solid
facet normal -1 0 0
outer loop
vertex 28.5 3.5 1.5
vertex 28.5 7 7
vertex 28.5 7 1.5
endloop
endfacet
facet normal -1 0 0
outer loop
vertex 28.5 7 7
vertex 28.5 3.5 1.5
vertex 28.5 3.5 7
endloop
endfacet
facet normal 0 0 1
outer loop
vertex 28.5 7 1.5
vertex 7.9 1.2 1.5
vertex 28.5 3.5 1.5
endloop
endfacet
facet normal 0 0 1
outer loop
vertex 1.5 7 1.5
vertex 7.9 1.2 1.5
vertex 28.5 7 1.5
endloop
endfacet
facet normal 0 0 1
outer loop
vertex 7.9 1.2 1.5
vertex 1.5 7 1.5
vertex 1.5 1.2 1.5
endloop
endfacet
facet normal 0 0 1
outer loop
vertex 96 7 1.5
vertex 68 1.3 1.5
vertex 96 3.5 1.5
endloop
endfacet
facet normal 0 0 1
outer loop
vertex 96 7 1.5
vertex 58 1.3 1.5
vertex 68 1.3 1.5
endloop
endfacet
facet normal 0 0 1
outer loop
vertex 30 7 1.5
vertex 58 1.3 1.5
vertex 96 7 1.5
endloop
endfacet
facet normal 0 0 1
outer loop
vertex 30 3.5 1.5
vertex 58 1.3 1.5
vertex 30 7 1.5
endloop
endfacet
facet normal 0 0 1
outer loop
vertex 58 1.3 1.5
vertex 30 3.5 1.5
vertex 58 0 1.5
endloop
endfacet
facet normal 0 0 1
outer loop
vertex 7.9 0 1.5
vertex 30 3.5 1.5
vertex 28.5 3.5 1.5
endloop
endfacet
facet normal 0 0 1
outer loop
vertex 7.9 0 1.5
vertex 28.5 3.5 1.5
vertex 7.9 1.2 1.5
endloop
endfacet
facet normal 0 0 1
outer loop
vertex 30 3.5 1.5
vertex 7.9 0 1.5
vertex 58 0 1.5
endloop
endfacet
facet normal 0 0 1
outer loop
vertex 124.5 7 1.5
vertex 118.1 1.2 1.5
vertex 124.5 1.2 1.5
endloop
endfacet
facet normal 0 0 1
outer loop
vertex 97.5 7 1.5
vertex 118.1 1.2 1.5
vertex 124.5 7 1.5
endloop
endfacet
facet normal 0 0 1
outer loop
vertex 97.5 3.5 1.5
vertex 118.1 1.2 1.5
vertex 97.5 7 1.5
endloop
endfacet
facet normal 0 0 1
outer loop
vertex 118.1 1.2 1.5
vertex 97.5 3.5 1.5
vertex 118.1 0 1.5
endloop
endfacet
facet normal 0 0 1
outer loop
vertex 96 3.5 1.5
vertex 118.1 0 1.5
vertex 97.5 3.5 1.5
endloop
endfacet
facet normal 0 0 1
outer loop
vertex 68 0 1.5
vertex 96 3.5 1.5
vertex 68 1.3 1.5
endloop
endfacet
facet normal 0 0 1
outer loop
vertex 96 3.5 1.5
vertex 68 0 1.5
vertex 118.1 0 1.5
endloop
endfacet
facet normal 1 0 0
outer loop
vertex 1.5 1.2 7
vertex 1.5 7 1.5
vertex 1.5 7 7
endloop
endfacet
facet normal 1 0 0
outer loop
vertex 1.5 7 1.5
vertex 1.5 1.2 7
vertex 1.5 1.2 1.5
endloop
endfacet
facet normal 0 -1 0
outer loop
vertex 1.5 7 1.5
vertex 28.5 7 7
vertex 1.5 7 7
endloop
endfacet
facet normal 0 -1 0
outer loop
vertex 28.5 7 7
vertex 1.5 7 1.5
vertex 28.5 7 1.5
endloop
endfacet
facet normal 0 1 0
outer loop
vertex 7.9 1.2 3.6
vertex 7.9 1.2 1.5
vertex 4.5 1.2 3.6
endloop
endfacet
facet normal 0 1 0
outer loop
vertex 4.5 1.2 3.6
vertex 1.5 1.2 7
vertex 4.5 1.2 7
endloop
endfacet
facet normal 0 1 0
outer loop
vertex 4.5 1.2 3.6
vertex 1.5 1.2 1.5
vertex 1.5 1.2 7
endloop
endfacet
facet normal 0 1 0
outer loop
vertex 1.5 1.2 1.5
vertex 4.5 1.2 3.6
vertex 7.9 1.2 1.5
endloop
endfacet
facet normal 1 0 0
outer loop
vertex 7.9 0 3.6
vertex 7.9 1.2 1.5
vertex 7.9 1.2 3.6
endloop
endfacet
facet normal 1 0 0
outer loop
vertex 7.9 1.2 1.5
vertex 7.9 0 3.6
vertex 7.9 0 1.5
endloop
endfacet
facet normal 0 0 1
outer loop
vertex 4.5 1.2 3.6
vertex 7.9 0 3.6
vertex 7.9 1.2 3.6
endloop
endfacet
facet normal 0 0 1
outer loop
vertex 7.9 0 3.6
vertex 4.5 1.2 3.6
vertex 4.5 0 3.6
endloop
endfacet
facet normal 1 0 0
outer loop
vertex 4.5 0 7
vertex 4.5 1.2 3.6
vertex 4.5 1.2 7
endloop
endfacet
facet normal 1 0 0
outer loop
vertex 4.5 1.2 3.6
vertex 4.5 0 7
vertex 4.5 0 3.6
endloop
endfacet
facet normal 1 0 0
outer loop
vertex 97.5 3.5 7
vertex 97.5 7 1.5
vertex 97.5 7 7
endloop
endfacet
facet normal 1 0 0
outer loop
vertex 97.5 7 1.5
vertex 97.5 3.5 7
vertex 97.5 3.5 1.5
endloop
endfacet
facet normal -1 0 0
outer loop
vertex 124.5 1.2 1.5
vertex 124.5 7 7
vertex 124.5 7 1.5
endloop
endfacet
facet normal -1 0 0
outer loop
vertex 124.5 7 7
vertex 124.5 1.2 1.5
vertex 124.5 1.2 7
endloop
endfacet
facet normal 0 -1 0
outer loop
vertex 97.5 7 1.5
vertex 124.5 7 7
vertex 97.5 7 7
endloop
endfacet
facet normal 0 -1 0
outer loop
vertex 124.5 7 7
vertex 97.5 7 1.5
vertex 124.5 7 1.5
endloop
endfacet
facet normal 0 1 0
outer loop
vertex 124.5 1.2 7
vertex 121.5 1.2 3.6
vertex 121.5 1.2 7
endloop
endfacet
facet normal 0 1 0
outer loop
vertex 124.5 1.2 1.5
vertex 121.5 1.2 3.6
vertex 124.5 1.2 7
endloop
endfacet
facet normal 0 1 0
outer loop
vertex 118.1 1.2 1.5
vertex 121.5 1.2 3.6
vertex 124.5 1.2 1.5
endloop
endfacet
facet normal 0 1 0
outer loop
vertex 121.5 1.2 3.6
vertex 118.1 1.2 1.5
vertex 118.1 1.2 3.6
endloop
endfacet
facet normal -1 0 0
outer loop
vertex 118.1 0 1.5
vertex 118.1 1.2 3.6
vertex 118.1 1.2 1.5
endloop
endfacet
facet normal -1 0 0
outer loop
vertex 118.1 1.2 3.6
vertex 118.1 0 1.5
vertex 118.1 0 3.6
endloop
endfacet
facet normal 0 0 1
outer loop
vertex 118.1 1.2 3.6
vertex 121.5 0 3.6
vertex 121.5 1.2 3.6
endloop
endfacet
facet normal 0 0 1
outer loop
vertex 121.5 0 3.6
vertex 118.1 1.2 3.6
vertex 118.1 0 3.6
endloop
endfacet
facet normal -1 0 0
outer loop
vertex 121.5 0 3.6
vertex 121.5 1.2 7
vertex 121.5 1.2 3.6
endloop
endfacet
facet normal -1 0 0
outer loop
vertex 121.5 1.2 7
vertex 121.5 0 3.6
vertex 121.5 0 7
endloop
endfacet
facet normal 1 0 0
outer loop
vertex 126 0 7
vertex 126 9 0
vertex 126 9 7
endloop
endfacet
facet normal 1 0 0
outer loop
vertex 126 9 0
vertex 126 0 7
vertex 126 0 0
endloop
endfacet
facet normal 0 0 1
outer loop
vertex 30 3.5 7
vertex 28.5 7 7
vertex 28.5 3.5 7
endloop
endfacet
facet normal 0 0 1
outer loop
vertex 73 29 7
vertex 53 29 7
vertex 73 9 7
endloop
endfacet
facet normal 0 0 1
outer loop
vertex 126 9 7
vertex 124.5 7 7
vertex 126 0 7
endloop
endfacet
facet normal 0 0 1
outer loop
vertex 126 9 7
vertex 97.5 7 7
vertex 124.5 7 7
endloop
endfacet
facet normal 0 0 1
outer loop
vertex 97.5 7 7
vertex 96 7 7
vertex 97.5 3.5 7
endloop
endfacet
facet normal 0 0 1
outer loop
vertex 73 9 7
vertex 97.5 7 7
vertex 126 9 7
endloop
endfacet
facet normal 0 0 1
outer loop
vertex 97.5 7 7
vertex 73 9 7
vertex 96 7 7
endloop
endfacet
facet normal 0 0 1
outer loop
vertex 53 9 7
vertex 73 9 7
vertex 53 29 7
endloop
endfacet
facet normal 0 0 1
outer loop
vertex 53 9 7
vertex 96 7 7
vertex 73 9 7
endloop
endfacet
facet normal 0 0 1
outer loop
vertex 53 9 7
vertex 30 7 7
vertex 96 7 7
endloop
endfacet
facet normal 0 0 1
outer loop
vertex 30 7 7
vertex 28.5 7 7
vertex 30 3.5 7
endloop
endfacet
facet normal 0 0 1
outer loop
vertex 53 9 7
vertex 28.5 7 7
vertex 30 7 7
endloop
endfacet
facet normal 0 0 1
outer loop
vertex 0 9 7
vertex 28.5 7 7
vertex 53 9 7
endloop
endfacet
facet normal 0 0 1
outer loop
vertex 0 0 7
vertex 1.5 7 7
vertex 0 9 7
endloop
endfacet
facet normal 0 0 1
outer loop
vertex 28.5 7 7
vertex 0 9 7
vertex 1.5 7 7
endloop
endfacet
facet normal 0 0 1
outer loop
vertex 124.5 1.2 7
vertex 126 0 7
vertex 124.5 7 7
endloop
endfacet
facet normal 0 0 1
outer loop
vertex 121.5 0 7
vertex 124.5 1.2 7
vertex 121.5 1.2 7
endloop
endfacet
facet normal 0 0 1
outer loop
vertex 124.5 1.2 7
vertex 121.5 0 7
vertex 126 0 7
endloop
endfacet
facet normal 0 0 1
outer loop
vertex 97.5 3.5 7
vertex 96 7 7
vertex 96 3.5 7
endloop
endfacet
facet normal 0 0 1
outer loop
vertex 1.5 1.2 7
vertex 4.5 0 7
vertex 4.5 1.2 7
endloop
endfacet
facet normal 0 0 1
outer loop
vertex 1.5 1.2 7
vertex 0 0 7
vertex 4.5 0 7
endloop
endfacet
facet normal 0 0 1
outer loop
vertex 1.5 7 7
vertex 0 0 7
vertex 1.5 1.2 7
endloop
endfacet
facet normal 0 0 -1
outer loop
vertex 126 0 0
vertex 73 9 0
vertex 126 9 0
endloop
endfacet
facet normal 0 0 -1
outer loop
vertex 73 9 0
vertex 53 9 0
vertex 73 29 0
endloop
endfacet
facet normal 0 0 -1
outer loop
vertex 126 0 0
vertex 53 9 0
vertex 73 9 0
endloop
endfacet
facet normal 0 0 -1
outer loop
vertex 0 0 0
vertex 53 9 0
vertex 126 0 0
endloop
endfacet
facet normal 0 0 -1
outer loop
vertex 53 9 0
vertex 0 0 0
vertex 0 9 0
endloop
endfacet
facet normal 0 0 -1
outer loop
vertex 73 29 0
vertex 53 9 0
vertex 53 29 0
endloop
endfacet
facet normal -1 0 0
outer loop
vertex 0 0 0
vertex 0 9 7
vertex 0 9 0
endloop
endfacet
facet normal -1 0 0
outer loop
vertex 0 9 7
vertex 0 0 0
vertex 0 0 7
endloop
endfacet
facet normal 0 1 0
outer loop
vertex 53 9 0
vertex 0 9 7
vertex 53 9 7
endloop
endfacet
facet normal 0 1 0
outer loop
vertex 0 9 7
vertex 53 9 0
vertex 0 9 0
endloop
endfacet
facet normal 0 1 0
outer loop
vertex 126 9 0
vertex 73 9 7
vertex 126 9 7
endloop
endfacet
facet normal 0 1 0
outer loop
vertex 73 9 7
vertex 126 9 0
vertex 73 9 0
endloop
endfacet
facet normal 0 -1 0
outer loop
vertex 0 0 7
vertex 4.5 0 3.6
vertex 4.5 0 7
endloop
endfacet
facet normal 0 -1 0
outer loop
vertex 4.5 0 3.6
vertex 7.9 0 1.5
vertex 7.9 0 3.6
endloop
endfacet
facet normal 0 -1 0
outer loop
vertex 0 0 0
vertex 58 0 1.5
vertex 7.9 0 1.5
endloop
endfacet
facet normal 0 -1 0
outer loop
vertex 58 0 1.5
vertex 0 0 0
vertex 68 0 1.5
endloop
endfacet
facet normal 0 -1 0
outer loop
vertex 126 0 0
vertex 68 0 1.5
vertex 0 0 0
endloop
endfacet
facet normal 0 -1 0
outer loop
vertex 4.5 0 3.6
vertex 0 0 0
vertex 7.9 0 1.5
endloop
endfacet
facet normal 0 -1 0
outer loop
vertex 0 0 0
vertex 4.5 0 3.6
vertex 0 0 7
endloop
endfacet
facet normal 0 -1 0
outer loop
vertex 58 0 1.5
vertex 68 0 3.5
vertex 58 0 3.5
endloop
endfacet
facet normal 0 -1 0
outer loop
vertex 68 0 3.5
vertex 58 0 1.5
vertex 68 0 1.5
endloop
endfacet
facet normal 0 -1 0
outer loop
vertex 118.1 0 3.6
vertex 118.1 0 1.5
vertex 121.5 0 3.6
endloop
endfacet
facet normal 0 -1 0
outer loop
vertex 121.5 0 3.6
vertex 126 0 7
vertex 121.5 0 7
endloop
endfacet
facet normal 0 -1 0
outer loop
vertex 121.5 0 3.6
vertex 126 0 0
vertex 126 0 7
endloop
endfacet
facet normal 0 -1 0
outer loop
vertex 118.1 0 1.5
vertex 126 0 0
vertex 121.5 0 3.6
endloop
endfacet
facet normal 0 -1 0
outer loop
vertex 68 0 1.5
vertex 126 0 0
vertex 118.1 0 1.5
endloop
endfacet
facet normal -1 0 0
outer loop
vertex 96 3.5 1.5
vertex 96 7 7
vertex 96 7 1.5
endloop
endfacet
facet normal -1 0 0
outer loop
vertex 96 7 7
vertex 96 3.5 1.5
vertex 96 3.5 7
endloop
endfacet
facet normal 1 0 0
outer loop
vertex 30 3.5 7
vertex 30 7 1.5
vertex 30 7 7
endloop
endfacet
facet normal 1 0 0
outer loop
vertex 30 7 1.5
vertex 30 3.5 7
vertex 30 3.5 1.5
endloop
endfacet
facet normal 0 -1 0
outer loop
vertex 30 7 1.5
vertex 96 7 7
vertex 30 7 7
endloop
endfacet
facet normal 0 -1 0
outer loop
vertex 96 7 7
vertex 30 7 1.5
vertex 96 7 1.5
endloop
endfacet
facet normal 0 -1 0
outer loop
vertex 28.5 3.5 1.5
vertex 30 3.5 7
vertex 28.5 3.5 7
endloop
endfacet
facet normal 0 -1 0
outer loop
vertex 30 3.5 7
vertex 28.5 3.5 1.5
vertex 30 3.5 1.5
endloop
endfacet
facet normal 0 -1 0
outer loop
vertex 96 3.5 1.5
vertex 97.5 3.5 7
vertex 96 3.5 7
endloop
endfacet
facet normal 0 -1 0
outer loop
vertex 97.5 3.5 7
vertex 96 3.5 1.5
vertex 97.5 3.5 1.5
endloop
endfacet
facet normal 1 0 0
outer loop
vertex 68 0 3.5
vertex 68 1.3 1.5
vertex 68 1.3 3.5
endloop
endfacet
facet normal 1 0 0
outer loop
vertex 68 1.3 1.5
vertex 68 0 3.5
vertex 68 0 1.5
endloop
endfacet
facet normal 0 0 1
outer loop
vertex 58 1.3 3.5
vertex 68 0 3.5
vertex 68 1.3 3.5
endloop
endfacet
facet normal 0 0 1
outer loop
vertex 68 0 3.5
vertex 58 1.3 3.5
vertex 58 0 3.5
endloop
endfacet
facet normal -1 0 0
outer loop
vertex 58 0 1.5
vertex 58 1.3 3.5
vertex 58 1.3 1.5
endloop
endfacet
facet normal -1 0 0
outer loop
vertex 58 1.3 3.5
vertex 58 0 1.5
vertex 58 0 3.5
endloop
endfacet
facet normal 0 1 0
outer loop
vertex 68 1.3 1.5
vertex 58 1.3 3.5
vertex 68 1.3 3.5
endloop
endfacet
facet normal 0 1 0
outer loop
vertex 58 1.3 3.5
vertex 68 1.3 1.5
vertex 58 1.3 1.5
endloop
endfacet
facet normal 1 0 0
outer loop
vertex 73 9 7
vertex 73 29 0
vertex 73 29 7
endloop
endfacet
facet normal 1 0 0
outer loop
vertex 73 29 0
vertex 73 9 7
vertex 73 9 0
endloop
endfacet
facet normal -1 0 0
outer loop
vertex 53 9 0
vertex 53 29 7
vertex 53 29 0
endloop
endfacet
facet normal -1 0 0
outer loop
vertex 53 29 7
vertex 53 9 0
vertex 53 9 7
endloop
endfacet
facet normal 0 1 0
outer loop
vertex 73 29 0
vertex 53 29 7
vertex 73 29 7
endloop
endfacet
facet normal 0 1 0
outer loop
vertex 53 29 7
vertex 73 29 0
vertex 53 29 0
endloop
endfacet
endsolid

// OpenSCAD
$fn = 90;

difference() {
    cube([126, 9, 7]);
    
    edge_cut();
    translate([126, 0, 0]) mirror([1, 0, 0]) edge_cut();
    translate([27 + 3, 1.2 - 2, 1.5]) cube([66, 7.8, 7]);
    translate([27 + 1, -7.8 + 3.5, 1.5]) cube([70, 7.8, 7]);
}

translate([(126 - 10) / 2, 0, 1.3]) cube([10, 1.3, 2.2]);

translate([(126 - 20) / 2, 9, 0]) cube([20, 20, 7]);

module edge_cut() {
    translate([1.5, 1.2, 1.5]) cube([27, 5.8, 7]);
    translate([1.5 + 6.4, -3.2, 1.5]) cube([27 - 6.4, 7.8, 7]);
    translate([1.5 + 3, -3.2, 3.6]) cube([27 - 6.4, 7.8, 7]);
}
